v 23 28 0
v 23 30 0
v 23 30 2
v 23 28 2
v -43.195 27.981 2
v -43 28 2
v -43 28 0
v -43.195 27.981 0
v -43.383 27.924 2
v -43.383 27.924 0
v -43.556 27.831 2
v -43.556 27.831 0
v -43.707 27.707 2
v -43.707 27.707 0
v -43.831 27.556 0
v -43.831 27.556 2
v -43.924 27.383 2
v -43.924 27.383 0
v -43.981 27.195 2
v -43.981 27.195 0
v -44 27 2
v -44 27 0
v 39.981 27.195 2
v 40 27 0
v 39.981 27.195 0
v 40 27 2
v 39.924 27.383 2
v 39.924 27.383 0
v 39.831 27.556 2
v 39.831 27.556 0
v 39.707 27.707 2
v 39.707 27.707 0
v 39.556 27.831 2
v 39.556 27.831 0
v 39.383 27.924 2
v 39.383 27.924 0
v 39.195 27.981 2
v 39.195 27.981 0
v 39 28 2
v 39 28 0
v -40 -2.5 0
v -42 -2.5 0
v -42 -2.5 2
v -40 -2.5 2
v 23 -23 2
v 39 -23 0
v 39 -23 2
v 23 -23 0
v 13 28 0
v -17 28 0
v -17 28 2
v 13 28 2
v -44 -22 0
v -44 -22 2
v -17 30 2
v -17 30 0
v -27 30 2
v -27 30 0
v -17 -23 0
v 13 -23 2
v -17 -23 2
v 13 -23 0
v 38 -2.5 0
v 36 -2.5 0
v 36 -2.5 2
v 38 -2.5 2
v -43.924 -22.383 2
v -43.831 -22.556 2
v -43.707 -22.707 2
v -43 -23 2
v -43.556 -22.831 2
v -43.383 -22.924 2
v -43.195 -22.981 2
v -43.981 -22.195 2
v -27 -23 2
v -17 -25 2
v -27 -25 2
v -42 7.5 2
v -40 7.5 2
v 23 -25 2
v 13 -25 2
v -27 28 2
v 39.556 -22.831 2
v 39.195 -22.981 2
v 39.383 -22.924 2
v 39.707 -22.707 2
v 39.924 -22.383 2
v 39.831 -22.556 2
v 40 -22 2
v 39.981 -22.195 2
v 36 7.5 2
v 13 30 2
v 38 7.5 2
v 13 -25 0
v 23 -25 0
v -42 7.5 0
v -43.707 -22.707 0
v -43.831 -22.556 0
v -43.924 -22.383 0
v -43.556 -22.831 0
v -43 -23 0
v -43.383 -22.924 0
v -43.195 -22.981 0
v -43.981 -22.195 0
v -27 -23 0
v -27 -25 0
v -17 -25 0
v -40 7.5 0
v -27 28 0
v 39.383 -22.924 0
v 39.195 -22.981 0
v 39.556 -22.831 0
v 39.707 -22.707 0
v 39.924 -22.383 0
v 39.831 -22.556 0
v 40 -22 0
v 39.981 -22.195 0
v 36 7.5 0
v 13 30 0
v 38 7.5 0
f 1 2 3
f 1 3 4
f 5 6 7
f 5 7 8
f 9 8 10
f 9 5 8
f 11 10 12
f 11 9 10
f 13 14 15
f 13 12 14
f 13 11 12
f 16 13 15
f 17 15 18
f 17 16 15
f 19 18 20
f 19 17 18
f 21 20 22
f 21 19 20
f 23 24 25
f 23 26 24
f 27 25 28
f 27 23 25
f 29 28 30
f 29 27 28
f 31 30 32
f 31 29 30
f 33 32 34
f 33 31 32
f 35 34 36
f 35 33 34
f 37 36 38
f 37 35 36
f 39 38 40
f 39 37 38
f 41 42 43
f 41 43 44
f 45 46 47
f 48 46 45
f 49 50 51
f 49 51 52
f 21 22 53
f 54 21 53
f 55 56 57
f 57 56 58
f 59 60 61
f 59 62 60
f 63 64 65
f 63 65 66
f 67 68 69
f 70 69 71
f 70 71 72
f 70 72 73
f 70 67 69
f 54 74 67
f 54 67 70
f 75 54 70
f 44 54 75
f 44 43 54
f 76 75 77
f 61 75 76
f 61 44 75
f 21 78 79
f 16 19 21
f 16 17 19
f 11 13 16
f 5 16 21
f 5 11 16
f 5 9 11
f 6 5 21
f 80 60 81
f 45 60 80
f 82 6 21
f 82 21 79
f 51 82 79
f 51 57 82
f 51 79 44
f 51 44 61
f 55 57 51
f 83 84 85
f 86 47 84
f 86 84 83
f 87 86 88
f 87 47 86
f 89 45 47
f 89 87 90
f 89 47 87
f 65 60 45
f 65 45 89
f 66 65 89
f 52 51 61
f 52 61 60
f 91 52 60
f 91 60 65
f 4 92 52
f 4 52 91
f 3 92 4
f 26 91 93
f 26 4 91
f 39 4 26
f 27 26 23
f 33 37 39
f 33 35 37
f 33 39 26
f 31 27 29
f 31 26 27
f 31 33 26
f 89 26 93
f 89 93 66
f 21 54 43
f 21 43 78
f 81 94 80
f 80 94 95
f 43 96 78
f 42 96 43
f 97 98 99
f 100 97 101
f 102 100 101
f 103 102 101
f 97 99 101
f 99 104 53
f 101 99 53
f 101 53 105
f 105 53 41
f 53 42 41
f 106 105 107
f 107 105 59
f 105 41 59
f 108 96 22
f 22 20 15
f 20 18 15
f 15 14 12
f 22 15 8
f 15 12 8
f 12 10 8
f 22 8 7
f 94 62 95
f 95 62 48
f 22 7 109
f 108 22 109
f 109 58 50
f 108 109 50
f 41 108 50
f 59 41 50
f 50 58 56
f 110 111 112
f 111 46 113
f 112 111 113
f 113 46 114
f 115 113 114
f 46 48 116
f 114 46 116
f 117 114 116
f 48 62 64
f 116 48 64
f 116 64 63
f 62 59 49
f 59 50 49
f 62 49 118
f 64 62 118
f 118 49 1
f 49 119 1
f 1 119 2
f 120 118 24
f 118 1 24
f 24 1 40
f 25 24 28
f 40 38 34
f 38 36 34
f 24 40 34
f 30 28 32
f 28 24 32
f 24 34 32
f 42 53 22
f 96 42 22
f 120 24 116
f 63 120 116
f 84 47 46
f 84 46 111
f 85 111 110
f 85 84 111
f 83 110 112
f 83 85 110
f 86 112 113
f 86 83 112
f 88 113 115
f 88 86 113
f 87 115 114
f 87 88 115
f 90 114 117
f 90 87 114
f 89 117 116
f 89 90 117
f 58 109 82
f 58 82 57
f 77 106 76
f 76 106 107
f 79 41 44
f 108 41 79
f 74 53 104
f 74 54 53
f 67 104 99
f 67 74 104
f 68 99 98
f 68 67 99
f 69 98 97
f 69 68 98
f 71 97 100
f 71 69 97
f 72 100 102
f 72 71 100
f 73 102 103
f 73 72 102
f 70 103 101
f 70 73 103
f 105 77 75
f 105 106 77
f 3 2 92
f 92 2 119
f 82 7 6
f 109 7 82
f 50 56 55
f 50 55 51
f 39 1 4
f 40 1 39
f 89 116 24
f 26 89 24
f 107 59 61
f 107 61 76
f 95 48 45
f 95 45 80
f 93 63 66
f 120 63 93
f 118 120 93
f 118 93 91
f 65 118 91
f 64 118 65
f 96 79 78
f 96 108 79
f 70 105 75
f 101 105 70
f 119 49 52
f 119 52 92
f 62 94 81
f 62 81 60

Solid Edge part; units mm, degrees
sketch "Sketch1" plane through (0, 0, 0) normal (0, 0, 1) x (1, 0, 0)
  line L0 (40, -25) -> (40, 30)
  line L1 (40, 30) -> (-44, 30)
  line L2 (-44, 30) -> (-44, -25)
  line L3 (-44, -25) -> (40, -25)
extrude "ExtrudedProtrusion_3" add sketch "Sketch1" along normal blind 2
sketch "Sketch2" plane through (0, 0, 0) normal (0, 0, 1) x (1, 0, 0)
  line L0 (-44, 28) -> (-27, 28)
  line L1 (-27, 28) -> (-27, 30)
  line L2 (-27, 30) -> (-44, 30)
  line L3 (-44, 30) -> (-44, 28)
extrude "ExtrudedCutout_9" cut sketch "Sketch2" along normal blind 2
sketch "Sketch3" plane through (0, 0, 0) normal (0, 0, 1) x (1, 0, 0)
  line L0 (-17, 28) -> (13, 28)
  line L1 (13, 28) -> (13, 30)
  line L2 (13, 30) -> (-17, 30)
  line L3 (-17, 30) -> (-17, 28)
extrude "ExtrudedCutout_10" cut sketch "Sketch3" along normal blind 2
sketch "Sketch4" plane through (0, 0, 0) normal (0, 0, 1) x (1, 0, 0)
  line L0 (23, 28) -> (40, 28)
  line L1 (40, 28) -> (40, 30)
  line L2 (40, 30) -> (23, 30)
  line L3 (23, 30) -> (23, 28)
extrude "ExtrudedCutout_11" cut sketch "Sketch4" along normal blind 2
sketch "Sketch5" plane through (0, 0, 0) normal (0, 0, 1) x (1, 0, 0)
  line L0 (38, -2.5) -> (38, 7.5)
  line L1 (38, 7.5) -> (36, 7.5)
  line L2 (36, 7.5) -> (36, -2.5)
  line L3 (36, -2.5) -> (38, -2.5)
extrude "ExtrudedCutout_12" cut sketch "Sketch5" along normal blind 2
sketch "Sketch6" plane through (0, 0, 0) normal (0, 0, 1) x (1, 0, 0)
  line L0 (40, -23) -> (23, -23)
  line L1 (23, -23) -> (23, -25)
  line L2 (23, -25) -> (40, -25)
  line L3 (40, -25) -> (40, -23)
extrude "ExtrudedCutout_13" cut sketch "Sketch6" along normal blind 2
sketch "Sketch7" plane through (0, 0, 0) normal (0, 0, 1) x (1, 0, 0)
  line L0 (13, -23) -> (-17, -23)
  line L1 (-17, -23) -> (-17, -25)
  line L2 (-17, -25) -> (13, -25)
  line L3 (13, -25) -> (13, -23)
extrude "ExtrudedCutout_14" cut sketch "Sketch7" along normal blind 2
sketch "Sketch8" plane through (0, 0, 0) normal (0, 0, 1) x (1, 0, 0)
  line L0 (-27, -23) -> (-44, -23)
  line L1 (-44, -23) -> (-44, -25)
  line L2 (-44, -25) -> (-27, -25)
  line L3 (-27, -25) -> (-27, -23)
extrude "ExtrudedCutout_15" cut sketch "Sketch8" along normal blind 2
sketch "Sketch9" plane through (0, 0, 0) normal (0, 0, 1) x (1, 0, 0)
  line L0 (-40, -2.5) -> (-40, 7.5)
  line L1 (-40, 7.5) -> (-42, 7.5)
  line L2 (-42, 7.5) -> (-42, -2.5)
  line L3 (-42, -2.5) -> (-40, -2.5)
extrude "ExtrudedCutout_16" cut sketch "Sketch9" along normal blind 2
fillet "Round_1" radius 1 1 edges at (-44, -23, 1)
fillet "Round_2" radius 1 3 edges at (-44, 28, 1) (40, 28, 1) (40, -23, 1)
properties material "Acrylic, high impact grade"
